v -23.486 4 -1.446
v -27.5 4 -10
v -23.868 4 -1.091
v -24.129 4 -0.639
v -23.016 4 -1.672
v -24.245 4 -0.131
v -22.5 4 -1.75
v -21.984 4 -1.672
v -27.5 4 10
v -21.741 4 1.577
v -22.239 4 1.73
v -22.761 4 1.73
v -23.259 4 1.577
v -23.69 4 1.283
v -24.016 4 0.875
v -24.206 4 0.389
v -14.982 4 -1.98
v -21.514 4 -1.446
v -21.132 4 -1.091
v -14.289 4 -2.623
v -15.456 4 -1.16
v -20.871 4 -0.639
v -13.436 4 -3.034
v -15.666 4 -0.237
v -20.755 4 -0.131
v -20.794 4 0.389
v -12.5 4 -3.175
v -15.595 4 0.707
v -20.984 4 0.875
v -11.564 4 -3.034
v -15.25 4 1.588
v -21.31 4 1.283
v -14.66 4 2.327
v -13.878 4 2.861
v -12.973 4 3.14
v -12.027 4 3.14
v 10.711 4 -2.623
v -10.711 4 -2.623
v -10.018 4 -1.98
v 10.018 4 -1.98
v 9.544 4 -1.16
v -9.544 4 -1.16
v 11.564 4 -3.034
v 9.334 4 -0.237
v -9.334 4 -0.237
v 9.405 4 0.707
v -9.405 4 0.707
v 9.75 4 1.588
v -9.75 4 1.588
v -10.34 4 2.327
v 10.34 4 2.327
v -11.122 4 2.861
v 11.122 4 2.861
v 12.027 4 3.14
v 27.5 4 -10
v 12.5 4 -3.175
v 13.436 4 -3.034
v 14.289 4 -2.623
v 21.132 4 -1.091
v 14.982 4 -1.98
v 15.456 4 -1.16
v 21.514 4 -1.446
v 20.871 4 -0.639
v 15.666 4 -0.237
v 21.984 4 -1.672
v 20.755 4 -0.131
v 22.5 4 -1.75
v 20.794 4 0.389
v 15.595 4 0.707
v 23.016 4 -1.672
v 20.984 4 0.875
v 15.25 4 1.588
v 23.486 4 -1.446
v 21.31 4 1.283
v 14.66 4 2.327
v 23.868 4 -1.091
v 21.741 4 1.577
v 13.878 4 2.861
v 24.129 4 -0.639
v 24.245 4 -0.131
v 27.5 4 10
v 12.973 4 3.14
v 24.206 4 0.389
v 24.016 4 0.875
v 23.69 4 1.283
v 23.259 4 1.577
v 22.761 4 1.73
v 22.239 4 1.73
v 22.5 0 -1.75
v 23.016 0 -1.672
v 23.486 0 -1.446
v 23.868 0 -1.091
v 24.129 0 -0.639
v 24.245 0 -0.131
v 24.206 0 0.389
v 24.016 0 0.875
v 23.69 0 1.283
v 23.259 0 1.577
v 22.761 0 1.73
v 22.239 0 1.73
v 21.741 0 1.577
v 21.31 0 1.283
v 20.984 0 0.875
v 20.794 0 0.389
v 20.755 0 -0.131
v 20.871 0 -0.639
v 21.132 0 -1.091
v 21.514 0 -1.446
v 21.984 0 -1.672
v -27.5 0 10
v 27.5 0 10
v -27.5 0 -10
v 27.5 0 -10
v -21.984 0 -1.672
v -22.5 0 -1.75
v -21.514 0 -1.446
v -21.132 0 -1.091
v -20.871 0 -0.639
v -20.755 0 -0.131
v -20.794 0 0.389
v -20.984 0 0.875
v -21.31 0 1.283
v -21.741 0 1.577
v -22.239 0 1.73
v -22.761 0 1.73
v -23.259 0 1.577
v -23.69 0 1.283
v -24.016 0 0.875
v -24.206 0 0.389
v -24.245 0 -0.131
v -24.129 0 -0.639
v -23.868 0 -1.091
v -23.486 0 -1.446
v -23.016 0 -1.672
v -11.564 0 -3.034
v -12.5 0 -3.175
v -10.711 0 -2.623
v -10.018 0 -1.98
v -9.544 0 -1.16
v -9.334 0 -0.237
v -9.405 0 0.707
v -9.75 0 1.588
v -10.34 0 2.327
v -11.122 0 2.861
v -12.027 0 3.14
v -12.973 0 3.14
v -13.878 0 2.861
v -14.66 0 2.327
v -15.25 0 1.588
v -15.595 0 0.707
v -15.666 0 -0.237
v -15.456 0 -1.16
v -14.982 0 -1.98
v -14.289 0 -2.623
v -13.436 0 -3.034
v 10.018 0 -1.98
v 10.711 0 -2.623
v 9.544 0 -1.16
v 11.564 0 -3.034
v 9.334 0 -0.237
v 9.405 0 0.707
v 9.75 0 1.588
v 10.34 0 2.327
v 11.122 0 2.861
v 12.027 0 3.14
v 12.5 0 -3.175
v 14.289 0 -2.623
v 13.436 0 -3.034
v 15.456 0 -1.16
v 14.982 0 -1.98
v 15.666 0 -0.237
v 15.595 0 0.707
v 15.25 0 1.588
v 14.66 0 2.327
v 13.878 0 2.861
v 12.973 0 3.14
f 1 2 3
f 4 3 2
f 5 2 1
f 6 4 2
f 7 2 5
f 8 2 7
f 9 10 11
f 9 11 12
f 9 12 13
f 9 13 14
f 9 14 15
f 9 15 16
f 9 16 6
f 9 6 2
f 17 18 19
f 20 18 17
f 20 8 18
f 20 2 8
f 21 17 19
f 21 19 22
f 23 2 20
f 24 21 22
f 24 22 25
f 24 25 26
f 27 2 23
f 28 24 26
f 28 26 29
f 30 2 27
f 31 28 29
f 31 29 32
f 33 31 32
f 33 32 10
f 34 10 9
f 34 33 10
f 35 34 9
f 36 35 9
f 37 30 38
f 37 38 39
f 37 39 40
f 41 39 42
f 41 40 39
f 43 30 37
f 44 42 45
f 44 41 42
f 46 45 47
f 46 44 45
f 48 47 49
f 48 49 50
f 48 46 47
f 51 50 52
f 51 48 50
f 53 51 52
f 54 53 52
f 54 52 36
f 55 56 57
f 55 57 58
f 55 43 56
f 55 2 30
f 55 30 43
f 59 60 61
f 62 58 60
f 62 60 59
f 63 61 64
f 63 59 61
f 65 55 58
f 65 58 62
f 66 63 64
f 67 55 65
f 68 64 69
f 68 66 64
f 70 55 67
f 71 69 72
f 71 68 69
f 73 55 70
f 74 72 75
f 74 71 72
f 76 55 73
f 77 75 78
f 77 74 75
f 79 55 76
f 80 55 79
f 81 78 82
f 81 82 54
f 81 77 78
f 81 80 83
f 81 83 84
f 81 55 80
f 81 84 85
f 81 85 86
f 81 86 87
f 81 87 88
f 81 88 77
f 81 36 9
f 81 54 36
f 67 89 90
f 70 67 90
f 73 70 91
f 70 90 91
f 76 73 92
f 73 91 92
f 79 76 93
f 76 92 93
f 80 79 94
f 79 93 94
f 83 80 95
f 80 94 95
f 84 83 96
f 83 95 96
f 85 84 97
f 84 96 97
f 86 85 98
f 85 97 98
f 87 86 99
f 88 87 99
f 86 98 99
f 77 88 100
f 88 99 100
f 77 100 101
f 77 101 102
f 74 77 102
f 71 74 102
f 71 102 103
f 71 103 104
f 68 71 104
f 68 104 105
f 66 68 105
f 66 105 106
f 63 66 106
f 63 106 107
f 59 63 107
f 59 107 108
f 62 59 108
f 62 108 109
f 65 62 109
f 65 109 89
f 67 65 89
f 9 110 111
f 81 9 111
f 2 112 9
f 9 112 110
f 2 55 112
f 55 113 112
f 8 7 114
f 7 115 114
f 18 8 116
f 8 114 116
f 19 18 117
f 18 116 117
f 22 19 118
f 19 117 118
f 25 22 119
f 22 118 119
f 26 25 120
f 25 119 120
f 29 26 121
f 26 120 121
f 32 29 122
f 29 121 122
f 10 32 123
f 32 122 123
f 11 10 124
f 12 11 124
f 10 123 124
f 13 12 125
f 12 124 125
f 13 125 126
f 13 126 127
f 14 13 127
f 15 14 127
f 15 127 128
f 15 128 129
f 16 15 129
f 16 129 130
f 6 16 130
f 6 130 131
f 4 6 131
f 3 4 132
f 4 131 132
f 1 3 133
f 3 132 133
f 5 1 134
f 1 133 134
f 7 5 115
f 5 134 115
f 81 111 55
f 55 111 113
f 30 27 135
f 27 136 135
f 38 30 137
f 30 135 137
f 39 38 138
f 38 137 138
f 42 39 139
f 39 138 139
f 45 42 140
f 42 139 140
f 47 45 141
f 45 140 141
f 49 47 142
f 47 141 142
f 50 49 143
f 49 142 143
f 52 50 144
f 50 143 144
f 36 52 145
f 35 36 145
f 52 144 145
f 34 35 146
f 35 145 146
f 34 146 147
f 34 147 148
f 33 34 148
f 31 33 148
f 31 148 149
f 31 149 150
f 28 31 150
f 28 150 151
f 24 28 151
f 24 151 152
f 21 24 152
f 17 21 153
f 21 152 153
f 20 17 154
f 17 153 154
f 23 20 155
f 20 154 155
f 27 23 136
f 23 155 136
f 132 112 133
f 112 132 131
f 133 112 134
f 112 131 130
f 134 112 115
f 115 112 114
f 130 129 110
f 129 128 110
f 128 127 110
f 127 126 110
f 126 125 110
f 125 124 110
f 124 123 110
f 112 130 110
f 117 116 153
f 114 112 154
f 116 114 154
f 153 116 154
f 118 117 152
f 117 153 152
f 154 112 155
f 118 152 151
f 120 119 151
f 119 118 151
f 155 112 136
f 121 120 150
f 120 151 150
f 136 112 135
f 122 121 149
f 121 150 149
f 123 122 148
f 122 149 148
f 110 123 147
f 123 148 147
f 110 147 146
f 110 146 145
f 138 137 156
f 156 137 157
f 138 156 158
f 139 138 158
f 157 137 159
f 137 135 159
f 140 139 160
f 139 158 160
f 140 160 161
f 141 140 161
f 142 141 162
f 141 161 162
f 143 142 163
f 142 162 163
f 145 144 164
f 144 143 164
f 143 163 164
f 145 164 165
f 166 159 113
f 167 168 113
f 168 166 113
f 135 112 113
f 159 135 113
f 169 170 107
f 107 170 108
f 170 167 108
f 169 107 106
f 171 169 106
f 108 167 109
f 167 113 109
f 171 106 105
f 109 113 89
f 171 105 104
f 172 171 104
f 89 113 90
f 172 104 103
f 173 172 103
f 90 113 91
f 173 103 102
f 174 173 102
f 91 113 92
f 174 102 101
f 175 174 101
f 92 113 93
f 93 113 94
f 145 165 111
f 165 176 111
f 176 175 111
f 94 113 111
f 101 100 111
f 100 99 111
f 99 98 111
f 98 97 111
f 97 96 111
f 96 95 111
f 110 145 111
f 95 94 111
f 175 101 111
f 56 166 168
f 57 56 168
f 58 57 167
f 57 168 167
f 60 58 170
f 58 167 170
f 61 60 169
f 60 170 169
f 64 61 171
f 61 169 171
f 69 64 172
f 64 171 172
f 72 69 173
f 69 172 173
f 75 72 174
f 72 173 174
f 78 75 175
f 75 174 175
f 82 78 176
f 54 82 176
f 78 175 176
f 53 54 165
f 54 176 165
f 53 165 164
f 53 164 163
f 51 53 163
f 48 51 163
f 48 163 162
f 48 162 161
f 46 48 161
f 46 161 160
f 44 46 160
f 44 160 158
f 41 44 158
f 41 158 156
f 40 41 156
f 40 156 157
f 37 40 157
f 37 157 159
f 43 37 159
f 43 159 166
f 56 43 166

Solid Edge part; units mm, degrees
sketch "Sketch1" plane through (0, 0, 0) normal (0, -1, 0) x (1, 0, 0)
  line L0 (-27.5, 10) -> (27.5, 10)
  line L1 (27.5, 10) -> (27.5, -10)
  line L2 (27.5, -10) -> (-27.5, -10)
  line L3 (-27.5, -10) -> (-27.5, 10)
  dimension "D1" = 55
  dimension "D2" = 20
extrude "Protrusion1" add sketch "Sketch1" against normal blind 4
hole "Bohrung_1" at (12.5, 0, 0) direction (0, 1, 0) diameter 6.35 end up to next
hole "Hole1" at (-12.5, 0, 0) direction (0, 1, 0) diameter 6.35 end up to next
hole "Bohrung_3" at (22.5, 0, 0) direction (0, 1, 0) diameter 3.5 end up to next
hole "Hole2" at (-22.5, 0, 0) direction (0, 1, 0) diameter 3.5 end up to next
